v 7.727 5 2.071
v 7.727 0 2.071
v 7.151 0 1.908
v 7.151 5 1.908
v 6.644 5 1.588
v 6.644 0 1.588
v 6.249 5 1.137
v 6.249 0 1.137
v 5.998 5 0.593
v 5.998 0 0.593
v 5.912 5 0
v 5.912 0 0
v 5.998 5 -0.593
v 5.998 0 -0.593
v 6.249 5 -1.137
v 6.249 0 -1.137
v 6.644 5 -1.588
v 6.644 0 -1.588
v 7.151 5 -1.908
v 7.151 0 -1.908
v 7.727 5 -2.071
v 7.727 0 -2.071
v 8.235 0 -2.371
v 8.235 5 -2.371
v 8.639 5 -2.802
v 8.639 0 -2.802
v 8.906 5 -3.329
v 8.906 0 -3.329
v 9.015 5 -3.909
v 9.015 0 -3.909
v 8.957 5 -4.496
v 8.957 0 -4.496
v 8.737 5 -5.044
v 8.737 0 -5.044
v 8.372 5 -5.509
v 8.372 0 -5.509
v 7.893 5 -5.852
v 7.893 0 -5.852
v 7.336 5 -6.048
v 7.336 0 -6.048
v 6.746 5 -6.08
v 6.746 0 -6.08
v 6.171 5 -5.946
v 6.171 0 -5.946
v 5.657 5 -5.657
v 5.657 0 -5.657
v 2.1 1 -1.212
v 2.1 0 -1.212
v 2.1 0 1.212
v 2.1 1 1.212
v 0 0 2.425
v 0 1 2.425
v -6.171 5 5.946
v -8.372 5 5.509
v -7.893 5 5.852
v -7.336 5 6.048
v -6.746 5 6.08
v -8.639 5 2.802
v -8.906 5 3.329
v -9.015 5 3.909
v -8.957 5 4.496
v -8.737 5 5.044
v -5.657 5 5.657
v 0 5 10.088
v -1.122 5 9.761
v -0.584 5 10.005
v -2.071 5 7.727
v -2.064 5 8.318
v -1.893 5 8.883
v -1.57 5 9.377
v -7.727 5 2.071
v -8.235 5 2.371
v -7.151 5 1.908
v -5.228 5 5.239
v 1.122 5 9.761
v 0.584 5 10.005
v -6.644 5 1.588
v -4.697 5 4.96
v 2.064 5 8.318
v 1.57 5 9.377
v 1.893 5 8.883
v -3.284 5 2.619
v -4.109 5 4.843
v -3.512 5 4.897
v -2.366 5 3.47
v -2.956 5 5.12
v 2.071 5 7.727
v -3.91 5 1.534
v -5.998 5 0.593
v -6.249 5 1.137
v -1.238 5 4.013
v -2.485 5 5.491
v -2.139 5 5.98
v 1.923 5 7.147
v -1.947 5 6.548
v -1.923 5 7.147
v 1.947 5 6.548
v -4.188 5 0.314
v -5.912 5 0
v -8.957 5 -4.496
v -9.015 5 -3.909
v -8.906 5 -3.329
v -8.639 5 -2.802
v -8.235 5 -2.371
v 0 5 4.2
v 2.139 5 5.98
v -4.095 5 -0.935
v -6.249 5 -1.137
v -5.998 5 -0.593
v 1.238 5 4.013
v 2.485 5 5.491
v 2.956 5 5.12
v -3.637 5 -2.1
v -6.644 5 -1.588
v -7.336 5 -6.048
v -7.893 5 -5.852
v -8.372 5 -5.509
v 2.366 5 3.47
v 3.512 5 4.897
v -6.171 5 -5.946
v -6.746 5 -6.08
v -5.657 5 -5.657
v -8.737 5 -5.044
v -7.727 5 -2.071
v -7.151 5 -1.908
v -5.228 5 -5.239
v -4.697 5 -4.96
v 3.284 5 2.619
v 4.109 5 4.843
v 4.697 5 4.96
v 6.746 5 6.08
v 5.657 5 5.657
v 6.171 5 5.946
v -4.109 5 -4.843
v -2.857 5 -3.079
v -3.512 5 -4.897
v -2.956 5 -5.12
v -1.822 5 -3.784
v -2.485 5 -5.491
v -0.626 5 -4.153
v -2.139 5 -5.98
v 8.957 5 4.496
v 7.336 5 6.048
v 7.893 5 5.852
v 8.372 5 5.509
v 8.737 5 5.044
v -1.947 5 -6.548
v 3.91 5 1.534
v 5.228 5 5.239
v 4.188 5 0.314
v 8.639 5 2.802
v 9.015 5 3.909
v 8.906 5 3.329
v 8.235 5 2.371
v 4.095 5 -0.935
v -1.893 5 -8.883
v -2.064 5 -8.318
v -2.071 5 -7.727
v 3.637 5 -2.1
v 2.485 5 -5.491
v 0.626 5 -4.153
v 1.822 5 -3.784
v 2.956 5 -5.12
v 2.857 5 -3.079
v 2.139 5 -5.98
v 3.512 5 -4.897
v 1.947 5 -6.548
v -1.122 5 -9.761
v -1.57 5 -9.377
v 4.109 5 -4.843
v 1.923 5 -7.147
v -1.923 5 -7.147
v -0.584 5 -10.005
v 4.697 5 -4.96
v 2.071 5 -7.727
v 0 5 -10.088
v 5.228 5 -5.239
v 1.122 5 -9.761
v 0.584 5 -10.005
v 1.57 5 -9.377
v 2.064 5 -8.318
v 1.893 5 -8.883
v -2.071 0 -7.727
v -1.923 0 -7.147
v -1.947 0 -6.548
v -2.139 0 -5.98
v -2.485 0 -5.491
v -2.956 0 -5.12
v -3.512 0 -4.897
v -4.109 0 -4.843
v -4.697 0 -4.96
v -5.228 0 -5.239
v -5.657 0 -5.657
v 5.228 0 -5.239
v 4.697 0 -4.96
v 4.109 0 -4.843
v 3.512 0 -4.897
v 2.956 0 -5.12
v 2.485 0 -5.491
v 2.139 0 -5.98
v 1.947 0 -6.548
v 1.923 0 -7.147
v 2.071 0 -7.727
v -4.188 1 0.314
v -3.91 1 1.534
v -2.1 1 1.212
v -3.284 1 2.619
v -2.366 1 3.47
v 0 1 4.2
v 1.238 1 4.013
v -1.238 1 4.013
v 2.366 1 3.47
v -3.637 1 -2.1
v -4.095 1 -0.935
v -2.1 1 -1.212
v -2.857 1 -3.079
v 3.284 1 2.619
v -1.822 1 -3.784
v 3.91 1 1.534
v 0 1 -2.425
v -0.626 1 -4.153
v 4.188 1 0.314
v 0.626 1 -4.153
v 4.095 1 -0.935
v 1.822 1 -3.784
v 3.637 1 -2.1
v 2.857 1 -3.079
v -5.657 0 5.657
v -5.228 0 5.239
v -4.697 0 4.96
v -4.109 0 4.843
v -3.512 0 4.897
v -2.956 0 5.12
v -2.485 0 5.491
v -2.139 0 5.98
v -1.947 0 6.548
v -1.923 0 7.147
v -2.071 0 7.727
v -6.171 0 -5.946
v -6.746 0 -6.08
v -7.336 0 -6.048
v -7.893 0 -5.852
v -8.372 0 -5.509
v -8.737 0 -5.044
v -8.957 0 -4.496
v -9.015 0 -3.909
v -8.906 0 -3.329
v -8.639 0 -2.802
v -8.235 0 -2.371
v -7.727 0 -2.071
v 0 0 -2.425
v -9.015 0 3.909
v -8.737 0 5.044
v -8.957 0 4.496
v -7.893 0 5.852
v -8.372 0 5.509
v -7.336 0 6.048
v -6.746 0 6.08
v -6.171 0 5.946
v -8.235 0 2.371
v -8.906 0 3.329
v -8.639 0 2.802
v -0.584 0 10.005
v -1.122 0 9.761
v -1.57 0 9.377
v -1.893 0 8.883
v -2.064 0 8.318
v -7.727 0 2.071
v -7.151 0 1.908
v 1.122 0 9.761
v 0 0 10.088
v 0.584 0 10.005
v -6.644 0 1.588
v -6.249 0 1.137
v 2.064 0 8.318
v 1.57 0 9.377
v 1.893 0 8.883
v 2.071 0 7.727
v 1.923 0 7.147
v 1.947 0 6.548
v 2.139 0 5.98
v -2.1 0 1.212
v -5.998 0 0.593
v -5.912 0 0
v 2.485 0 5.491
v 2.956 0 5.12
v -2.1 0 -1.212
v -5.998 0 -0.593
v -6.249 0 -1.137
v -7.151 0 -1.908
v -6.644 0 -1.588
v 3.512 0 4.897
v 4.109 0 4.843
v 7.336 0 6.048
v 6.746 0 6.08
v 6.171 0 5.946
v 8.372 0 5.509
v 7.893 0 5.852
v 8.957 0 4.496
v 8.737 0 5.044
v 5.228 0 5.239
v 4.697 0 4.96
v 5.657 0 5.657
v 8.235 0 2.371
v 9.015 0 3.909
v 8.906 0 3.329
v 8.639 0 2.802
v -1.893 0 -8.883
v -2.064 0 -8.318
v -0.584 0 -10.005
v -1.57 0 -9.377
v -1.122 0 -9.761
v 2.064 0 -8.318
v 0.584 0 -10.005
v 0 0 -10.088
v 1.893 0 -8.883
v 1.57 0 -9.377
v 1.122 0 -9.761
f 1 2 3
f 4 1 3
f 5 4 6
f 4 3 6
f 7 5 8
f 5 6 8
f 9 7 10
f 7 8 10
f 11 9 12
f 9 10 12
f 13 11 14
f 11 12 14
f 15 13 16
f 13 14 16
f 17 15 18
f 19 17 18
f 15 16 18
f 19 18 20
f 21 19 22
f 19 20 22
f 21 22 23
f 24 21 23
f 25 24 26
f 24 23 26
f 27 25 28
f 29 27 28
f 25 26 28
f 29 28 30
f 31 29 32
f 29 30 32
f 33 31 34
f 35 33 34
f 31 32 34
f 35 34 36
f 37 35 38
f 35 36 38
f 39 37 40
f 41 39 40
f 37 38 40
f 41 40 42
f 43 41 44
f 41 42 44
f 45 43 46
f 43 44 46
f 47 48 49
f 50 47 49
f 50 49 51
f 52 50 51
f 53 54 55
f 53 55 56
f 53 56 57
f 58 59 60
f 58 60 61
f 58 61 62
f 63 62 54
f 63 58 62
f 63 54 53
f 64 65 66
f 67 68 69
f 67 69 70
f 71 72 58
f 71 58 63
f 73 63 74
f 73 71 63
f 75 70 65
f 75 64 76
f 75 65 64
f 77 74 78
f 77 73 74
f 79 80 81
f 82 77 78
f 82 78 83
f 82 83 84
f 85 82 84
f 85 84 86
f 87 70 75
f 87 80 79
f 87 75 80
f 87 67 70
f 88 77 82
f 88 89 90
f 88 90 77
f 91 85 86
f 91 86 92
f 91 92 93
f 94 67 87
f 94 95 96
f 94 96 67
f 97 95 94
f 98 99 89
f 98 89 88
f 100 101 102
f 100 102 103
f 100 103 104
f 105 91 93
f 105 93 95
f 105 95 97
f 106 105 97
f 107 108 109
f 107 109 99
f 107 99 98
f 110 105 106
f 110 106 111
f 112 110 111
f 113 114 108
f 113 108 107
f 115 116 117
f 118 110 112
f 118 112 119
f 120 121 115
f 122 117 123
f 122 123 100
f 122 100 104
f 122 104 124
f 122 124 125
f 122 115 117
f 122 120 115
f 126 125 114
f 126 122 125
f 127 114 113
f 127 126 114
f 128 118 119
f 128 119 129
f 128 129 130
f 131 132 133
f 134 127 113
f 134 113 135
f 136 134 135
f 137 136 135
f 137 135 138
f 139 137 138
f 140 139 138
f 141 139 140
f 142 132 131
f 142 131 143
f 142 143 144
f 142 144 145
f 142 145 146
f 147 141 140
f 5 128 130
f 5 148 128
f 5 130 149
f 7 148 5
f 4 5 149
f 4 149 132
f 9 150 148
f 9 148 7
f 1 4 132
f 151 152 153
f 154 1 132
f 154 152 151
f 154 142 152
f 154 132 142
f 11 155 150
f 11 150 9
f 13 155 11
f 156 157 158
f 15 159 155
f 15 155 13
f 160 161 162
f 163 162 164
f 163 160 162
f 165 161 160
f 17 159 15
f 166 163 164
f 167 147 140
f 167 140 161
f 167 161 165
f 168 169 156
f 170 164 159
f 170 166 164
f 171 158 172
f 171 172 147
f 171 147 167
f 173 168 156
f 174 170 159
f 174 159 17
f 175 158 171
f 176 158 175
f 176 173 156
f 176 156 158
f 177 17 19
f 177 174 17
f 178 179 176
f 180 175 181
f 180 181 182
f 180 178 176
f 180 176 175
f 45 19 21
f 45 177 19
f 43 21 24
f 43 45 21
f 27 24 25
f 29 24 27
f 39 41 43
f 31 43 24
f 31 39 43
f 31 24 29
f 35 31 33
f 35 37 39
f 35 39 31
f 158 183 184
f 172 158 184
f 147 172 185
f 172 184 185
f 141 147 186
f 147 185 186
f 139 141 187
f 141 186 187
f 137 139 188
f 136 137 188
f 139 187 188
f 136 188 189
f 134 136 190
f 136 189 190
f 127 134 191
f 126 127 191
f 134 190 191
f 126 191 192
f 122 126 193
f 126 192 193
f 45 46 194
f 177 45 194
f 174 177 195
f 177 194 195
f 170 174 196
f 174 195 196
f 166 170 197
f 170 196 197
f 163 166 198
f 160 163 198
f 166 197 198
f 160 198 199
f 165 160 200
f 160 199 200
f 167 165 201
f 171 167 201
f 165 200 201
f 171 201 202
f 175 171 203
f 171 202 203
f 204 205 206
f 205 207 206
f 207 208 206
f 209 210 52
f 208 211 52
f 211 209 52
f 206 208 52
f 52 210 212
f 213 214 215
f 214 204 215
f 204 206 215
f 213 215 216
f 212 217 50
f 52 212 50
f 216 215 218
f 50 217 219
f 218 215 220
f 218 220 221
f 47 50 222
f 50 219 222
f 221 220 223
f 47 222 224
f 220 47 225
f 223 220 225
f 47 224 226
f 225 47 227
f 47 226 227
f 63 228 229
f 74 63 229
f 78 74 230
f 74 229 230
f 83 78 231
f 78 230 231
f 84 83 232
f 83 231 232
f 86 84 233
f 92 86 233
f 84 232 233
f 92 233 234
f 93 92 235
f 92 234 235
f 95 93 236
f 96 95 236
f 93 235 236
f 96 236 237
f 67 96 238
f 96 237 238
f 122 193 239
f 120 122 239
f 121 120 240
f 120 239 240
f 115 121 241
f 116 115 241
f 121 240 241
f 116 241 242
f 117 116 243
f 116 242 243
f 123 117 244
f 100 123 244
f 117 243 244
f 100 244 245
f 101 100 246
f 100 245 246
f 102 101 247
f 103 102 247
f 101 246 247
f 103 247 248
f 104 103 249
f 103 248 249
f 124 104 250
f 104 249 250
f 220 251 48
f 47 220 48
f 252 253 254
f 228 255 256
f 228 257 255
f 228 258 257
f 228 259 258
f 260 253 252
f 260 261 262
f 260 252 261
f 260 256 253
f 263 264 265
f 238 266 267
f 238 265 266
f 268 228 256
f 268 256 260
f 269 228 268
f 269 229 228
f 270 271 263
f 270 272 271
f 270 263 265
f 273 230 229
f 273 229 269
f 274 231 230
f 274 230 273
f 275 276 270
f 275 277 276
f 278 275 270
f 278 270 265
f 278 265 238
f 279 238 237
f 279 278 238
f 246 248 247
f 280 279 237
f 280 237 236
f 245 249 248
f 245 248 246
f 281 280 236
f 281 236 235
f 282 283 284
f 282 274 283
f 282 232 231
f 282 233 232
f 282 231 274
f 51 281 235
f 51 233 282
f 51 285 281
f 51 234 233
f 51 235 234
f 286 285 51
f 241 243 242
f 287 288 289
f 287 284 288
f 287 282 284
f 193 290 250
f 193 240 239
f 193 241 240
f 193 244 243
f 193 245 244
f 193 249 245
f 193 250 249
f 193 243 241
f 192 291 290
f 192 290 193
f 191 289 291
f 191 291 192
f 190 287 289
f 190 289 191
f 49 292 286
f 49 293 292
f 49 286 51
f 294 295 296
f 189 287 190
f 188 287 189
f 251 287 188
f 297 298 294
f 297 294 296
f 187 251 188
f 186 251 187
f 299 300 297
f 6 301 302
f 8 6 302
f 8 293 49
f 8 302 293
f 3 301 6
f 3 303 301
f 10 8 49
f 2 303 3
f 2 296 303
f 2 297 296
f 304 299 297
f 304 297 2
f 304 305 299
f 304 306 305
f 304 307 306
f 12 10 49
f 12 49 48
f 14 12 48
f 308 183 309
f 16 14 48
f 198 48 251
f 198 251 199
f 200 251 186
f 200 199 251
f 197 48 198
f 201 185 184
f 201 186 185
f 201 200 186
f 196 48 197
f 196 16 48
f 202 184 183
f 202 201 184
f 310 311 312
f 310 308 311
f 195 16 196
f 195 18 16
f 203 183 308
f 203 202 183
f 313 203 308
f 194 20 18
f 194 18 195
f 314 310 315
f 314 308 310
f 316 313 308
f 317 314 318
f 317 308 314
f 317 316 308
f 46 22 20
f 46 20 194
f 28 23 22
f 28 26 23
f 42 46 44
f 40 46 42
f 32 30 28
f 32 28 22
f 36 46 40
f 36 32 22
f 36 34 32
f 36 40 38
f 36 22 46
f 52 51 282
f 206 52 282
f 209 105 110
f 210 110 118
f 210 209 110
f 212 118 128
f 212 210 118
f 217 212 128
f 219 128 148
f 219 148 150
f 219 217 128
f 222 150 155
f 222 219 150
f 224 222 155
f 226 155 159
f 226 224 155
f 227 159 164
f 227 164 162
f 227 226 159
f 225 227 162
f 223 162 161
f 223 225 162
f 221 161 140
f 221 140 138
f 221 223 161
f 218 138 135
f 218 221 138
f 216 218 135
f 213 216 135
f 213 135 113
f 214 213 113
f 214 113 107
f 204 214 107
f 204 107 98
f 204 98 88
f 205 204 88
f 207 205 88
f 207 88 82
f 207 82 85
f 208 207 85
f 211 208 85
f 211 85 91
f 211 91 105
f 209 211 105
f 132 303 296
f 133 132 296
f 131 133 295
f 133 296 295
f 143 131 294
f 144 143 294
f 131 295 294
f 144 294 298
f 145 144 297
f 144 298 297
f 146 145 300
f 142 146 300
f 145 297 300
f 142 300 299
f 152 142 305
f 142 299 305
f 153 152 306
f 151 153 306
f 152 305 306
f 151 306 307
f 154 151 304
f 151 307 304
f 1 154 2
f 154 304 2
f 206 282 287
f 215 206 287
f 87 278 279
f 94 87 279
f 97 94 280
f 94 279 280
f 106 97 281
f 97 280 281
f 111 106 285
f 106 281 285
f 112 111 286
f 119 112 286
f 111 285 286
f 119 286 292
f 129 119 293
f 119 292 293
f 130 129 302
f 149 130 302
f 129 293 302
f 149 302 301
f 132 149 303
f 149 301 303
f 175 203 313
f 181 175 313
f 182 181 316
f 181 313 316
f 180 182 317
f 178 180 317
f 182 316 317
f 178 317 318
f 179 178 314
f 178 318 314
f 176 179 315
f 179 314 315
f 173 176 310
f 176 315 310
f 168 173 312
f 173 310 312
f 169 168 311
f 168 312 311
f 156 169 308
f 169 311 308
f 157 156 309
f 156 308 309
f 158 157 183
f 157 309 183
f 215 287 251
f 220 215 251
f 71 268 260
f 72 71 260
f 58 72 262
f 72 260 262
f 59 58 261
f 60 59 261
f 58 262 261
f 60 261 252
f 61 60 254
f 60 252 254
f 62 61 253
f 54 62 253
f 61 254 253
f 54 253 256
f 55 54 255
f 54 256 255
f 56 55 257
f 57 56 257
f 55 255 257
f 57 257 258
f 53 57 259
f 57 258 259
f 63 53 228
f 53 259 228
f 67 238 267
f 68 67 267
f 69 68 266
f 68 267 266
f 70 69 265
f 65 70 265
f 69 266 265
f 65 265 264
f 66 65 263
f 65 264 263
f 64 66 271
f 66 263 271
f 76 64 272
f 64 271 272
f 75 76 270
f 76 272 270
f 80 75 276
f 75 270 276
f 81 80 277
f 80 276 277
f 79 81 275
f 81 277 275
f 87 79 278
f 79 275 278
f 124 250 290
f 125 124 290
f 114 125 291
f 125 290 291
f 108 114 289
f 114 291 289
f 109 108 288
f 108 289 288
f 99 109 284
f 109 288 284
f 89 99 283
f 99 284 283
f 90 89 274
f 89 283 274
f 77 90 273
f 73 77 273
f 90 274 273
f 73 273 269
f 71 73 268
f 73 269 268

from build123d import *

# Parameters (mm, degrees)
SKETCH1_R           = 4.2
BOSS_EXTRUDE1_DEPTH = 5
SKETCH2_R           = 4.2
BOSS_EXTRUDE2_DEPTH = 1


with BuildPart() as part:
    # Sketch1 → Boss-Extrude1 (new body)
    with BuildSketch(Plane(origin=(0, 0, 0), x_dir=(1, 0, 0), z_dir=(0, 1, 0))):
        with BuildLine():
            ThreePointArc((2.070552361, 7.72740661), (0, 10.088419076), (-2.070552361, 7.72740661))
            ThreePointArc((-2.070552361, 7.72740661), (-2.955790462, 5.119579257), (-5.656854249, 5.656854249))
            ThreePointArc((-5.656854249, 5.656854249), (-8.736827203, 5.044209538), (-7.72740661, 2.070552361))
            ThreePointArc((-7.72740661, 2.070552361), (-5.911580924, 0), (-7.72740661, -2.070552361))
            ThreePointArc((-7.72740661, -2.070552361), (-8.736827203, -5.044209538), (-5.656854249, -5.656854249))
            ThreePointArc((-5.656854249, -5.656854249), (-2.955790462, -5.119579257), (-2.070552361, -7.72740661))
            ThreePointArc((-2.070552361, -7.72740661), (0, -10.088419076), (2.070552361, -7.72740661))
            ThreePointArc((2.070552361, -7.72740661), (2.955790462, -5.119579257), (5.656854249, -5.656854249))
            ThreePointArc((5.656854249, -5.656854249), (8.736827203, -5.044209538), (7.72740661, -2.070552361))
            ThreePointArc((7.72740661, -2.070552361), (5.911580924, 0), (7.72740661, 2.070552361))
            ThreePointArc((7.72740661, 2.070552361), (8.736827203, 5.044209538), (5.656854249, 5.656854249))
            ThreePointArc((5.656854249, 5.656854249), (2.955790462, 5.119579257), (2.070552361, 7.72740661))
        make_face()
        with Locations(Location((0, 0, 0), (0, 0, 270))):
            Circle(SKETCH1_R, mode=Mode.SUBTRACT)
    extrude(amount=BOSS_EXTRUDE1_DEPTH)

    # Sketch2 → Boss-Extrude2 (add)
    with BuildSketch(Plane.XZ):
        with Locations(Location((0, 0, 0), (0, 0, 270))):
            Circle(SKETCH2_R)
        Polygon((0, 2.424871131), (-2.1, 1.212435565), (-2.1, -1.212435565), (0, -2.424871131), (2.1, -1.212435565), (2.1, 1.212435565), align=None, mode=Mode.SUBTRACT)
    extrude(amount=-BOSS_EXTRUDE2_DEPTH)


solid = part.part
